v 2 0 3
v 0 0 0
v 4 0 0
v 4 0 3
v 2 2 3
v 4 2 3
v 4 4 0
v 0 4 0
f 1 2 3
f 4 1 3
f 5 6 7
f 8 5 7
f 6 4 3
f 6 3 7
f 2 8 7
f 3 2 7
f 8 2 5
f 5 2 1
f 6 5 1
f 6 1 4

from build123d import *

# Parameters (mm, degrees)
F0_W     = 4
F0_H     = 4
F1_DEPTH = 3
F3_DEPTH = 25
F5_DEPTH = 25


with BuildPart() as f1:
    # F0 (on Top) → F1 (new body)
    with BuildSketch(Plane.XY):
        with Locations((2, 2)):
            Rectangle(F0_W, F0_H)
    extrude(amount=F1_DEPTH)

    # F2 (on face) → F3 (cut)
    with BuildSketch(Plane.YZ.offset(4)):
        Polygon((2, 3), (4, 0), (4, 3), align=None)
    extrude(amount=-F3_DEPTH, mode=Mode.SUBTRACT)

    # F4 (on face) → F5 (cut)
    with BuildSketch(Plane.XZ):
        Polygon((0, 0), (2, 3), (0, 3), align=None)
    extrude(amount=-F5_DEPTH, mode=Mode.SUBTRACT)


solid = f1.part
